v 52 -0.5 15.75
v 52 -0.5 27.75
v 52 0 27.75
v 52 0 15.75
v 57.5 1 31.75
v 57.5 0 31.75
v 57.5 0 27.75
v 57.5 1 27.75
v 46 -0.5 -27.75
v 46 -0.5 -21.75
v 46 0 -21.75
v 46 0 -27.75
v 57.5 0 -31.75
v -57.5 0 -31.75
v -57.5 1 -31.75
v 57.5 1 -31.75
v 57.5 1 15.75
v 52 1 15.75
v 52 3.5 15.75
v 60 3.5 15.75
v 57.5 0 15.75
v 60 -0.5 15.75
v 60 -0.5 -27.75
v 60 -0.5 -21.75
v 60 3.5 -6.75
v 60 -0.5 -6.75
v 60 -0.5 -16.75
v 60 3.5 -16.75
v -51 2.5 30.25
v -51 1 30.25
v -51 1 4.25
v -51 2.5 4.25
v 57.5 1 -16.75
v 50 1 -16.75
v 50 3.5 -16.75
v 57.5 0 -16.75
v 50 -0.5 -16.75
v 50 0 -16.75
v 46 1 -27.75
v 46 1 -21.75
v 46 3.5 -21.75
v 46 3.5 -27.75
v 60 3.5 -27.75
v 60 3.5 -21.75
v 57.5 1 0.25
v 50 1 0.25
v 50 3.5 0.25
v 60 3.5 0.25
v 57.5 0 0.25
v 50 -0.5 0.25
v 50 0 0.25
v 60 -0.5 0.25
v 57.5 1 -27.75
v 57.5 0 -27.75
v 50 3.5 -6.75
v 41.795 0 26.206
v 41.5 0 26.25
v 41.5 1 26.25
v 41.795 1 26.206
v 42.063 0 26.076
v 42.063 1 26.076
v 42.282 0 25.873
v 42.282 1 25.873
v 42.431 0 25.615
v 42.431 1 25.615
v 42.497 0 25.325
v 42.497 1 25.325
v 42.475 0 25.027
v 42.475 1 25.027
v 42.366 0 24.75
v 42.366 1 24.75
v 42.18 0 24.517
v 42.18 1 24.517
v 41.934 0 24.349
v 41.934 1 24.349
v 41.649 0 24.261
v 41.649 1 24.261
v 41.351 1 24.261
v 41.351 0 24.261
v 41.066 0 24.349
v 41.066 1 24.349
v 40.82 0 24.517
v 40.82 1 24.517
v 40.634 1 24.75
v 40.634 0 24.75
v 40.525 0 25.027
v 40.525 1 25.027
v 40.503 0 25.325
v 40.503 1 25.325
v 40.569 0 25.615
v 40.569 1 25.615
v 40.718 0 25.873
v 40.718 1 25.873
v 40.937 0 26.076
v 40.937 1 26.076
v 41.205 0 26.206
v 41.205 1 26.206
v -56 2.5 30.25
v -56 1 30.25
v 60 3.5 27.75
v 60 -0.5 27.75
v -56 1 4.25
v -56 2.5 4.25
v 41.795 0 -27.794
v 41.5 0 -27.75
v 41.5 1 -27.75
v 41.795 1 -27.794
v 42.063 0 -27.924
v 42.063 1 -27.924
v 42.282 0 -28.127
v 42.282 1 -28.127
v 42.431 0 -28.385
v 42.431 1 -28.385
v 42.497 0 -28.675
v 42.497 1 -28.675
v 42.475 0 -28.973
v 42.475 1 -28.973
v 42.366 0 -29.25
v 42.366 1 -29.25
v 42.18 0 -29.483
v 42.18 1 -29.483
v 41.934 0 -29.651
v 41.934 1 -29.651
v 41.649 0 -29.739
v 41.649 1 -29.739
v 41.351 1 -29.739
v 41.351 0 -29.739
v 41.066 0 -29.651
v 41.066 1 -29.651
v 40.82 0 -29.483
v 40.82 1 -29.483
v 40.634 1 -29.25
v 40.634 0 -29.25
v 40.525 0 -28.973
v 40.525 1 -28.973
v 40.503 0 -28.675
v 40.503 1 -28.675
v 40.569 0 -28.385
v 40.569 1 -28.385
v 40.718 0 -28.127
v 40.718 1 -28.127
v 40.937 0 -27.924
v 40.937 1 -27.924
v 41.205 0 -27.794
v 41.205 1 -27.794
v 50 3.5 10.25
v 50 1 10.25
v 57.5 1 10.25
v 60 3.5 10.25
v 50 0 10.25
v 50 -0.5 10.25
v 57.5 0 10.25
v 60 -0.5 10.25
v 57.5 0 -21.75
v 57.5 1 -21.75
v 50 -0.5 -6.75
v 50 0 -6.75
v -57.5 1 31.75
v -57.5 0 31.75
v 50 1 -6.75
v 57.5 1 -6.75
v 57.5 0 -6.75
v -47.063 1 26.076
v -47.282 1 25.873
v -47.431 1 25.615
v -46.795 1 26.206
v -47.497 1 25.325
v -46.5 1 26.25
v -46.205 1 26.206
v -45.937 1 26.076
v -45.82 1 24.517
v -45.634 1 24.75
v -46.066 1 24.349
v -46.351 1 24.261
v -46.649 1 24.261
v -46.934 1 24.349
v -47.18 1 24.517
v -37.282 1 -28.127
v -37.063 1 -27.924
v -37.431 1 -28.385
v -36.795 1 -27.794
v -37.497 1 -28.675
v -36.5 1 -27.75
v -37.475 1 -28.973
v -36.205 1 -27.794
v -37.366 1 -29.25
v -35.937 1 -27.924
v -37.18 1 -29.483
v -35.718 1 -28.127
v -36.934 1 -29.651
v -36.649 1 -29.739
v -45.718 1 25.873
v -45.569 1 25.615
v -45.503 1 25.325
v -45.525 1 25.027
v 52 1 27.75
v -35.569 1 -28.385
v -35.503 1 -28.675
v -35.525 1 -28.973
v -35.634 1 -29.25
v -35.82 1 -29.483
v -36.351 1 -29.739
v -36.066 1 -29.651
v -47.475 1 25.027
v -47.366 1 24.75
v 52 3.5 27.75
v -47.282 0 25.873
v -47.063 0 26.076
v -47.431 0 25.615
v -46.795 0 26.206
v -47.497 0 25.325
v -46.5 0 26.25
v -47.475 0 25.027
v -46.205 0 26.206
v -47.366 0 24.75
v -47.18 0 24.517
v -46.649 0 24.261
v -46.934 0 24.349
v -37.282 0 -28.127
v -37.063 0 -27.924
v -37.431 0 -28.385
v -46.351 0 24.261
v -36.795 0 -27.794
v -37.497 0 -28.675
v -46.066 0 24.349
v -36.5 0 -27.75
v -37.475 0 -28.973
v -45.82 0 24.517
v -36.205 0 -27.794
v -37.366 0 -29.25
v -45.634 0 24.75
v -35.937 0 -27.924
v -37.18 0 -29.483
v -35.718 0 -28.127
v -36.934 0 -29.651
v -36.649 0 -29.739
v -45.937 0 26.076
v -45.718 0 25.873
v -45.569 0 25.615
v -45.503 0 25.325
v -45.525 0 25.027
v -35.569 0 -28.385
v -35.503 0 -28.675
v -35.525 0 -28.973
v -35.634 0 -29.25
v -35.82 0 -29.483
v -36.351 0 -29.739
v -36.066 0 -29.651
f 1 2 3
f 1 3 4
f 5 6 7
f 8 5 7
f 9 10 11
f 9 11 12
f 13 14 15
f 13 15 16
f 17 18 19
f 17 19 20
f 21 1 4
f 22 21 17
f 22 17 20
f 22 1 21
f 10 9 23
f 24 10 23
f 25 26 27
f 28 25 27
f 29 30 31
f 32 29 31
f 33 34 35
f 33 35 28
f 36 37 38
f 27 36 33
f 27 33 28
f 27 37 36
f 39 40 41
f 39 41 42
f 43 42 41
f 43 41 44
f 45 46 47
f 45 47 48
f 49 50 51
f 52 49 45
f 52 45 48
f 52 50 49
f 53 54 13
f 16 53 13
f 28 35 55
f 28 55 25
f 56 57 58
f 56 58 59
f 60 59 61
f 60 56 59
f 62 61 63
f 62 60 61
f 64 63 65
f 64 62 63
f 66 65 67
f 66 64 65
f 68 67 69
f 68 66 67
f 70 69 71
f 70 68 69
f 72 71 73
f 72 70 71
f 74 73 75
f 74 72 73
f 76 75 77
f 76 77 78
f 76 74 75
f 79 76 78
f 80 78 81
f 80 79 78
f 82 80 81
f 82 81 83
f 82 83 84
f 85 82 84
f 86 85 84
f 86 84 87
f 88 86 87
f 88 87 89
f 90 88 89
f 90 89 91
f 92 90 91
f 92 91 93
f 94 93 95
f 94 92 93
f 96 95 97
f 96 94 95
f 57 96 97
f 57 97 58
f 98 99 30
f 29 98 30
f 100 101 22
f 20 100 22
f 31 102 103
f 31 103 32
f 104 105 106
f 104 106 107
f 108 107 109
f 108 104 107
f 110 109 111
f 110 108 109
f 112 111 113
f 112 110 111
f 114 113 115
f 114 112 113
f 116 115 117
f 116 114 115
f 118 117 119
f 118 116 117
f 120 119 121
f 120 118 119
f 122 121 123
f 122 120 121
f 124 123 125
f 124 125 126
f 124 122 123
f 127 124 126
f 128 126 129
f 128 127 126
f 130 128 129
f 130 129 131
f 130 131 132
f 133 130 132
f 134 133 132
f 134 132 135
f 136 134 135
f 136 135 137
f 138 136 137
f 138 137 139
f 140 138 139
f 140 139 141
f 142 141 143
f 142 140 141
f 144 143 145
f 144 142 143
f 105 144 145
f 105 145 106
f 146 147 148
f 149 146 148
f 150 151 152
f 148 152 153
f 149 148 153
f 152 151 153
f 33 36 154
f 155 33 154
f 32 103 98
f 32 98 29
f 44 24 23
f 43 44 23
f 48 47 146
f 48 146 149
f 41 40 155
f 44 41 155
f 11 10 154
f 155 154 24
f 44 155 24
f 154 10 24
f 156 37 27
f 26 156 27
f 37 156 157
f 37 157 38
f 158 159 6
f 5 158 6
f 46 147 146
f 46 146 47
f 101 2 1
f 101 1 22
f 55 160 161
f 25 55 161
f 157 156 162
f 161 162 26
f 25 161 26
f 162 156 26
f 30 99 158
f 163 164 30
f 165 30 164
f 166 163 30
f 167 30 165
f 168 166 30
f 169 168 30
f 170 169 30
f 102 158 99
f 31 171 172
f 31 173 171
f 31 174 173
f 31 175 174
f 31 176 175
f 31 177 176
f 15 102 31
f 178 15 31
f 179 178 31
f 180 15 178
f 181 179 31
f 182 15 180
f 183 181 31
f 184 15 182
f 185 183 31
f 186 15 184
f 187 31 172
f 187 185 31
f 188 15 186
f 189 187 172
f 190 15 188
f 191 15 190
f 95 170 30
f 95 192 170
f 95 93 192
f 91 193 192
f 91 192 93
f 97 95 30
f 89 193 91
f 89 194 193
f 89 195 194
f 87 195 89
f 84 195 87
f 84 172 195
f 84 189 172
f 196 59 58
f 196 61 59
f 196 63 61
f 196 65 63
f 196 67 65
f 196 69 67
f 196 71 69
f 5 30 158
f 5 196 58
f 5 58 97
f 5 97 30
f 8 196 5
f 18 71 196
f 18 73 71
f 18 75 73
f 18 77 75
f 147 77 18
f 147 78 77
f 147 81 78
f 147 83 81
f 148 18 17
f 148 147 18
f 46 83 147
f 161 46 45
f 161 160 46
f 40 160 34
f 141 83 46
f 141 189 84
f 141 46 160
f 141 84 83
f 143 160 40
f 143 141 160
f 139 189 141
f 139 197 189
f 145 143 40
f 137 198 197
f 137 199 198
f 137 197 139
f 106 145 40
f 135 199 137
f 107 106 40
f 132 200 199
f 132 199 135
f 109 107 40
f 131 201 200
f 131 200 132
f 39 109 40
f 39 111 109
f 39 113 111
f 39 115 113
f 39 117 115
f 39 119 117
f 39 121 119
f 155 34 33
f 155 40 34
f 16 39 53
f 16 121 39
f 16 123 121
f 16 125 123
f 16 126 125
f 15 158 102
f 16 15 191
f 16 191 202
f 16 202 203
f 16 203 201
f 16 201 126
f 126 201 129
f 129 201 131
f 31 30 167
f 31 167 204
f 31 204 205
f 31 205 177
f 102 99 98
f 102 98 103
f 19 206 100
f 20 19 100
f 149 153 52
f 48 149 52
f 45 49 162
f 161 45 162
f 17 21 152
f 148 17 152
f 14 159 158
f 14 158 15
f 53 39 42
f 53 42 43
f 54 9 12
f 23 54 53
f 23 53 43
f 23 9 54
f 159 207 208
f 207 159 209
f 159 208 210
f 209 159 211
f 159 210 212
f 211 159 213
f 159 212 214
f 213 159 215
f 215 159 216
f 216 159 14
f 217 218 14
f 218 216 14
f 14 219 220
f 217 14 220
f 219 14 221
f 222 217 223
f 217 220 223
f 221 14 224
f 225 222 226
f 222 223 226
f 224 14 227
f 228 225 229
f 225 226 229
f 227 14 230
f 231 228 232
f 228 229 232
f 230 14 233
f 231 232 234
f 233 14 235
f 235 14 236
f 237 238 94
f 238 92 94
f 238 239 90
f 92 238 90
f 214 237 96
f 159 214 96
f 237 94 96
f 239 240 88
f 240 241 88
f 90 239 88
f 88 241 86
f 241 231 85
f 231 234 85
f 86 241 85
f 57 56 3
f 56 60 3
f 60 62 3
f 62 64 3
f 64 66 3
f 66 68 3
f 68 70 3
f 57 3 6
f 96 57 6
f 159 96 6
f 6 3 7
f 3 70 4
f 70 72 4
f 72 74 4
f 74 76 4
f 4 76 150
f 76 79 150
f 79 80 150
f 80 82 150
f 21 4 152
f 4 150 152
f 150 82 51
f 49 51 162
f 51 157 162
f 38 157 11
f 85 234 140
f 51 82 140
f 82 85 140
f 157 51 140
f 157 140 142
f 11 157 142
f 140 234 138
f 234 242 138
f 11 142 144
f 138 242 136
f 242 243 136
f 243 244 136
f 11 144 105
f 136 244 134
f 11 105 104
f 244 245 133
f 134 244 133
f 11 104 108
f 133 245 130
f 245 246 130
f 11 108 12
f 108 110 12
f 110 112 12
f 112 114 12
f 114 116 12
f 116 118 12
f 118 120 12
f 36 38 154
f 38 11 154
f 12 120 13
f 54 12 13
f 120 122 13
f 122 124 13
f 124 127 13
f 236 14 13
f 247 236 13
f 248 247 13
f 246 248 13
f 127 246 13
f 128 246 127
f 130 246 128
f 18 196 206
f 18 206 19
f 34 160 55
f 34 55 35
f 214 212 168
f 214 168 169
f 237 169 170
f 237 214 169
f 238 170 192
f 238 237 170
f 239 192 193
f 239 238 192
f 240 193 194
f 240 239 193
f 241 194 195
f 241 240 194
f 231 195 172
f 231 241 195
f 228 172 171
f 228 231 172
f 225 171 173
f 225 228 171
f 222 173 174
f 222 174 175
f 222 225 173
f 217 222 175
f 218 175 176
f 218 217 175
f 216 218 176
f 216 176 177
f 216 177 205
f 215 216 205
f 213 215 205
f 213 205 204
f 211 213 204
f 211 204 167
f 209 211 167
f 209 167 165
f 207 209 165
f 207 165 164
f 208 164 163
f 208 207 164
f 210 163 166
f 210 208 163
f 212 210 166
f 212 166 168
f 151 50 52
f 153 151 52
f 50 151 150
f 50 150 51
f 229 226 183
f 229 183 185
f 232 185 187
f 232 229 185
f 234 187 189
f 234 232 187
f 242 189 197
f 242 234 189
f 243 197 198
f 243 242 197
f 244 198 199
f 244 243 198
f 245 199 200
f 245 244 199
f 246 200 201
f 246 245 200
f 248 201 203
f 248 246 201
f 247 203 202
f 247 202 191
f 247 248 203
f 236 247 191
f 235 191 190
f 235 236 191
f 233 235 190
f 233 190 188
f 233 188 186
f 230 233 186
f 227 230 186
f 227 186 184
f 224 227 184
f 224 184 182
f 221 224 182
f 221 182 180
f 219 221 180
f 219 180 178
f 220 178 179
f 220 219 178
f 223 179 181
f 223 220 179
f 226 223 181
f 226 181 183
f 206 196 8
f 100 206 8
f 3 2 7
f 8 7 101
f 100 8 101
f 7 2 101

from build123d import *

# Parameters (mm, degrees)
SKETCH1_W               = 115
SKETCH1_H               = 63.5
SKETCH1_R               = 1
PCB_DEPTH               = 1
CONNECTORS_DEPTH        = 3.5
CONNECTORS_DEPTH_BACK   = 0.5
SKETCH2_W               = 8
SKETCH2_H               = 12
SKETCH2_W_2             = 10
SKETCH2_H_2             = 10
SKETCH2_W_3             = 14
SKETCH2_H_3             = 6
SKETCH3_W               = 5
SKETCH3_H               = 26
DISPLAY_CONNECTOR_DEPTH = 1.5


with BuildPart() as part:
    # Sketch1 → PCB (new body)
    with BuildSketch(Plane(origin=(0, 0, 0), x_dir=(1, 0, 0), z_dir=(0, 1, 0))):
        Rectangle(SKETCH1_W, SKETCH1_H)
        with Locations(Location((-46.5, -25.25, 0), (0, 0, 270))):
            Circle(SKETCH1_R, mode=Mode.SUBTRACT)
        with Locations(Location((-36.5, 28.75, 0), (0, 0, 270))):
            Circle(SKETCH1_R, mode=Mode.SUBTRACT)
        with Locations(Location((41.5, 28.75, 0), (0, 0, 270))):
            Circle(SKETCH1_R, mode=Mode.SUBTRACT)
        with Locations(Location((41.5, -25.25, 0), (0, 0, 270))):
            Circle(SKETCH1_R, mode=Mode.SUBTRACT)
    extrude(amount=PCB_DEPTH)

    # Sketch2 → CONNECTORS (add, two sides: drawn at the far end of the back side and taken through both)
    with BuildSketch(Plane(origin=(0, 0, 0), x_dir=(1, 0, 0), z_dir=(0, 1, 0)).offset(-CONNECTORS_DEPTH_BACK)):
        with Locations((56, -21.75)):
            Rectangle(SKETCH2_W, SKETCH2_H)
        with Locations((55, -5.25)):
            Rectangle(SKETCH2_W_2, SKETCH2_H_2)
        with Locations((55, 11.75)):
            Rectangle(SKETCH2_W_2, SKETCH2_H_2)
        with Locations((53, 24.75)):
            Rectangle(SKETCH2_W_3, SKETCH2_H_3)
    extrude(amount=CONNECTORS_DEPTH + CONNECTORS_DEPTH_BACK)

    # Sketch3 → DISPLAY CONNECTOR (add)
    with BuildSketch(Plane(origin=(0, 1, 0), x_dir=(1, 0, 0), z_dir=(0, 1, 0))):
        with Locations((-53.5, -17.25)):
            Rectangle(SKETCH3_W, SKETCH3_H)
    extrude(amount=DISPLAY_CONNECTOR_DEPTH)


solid = part.part
